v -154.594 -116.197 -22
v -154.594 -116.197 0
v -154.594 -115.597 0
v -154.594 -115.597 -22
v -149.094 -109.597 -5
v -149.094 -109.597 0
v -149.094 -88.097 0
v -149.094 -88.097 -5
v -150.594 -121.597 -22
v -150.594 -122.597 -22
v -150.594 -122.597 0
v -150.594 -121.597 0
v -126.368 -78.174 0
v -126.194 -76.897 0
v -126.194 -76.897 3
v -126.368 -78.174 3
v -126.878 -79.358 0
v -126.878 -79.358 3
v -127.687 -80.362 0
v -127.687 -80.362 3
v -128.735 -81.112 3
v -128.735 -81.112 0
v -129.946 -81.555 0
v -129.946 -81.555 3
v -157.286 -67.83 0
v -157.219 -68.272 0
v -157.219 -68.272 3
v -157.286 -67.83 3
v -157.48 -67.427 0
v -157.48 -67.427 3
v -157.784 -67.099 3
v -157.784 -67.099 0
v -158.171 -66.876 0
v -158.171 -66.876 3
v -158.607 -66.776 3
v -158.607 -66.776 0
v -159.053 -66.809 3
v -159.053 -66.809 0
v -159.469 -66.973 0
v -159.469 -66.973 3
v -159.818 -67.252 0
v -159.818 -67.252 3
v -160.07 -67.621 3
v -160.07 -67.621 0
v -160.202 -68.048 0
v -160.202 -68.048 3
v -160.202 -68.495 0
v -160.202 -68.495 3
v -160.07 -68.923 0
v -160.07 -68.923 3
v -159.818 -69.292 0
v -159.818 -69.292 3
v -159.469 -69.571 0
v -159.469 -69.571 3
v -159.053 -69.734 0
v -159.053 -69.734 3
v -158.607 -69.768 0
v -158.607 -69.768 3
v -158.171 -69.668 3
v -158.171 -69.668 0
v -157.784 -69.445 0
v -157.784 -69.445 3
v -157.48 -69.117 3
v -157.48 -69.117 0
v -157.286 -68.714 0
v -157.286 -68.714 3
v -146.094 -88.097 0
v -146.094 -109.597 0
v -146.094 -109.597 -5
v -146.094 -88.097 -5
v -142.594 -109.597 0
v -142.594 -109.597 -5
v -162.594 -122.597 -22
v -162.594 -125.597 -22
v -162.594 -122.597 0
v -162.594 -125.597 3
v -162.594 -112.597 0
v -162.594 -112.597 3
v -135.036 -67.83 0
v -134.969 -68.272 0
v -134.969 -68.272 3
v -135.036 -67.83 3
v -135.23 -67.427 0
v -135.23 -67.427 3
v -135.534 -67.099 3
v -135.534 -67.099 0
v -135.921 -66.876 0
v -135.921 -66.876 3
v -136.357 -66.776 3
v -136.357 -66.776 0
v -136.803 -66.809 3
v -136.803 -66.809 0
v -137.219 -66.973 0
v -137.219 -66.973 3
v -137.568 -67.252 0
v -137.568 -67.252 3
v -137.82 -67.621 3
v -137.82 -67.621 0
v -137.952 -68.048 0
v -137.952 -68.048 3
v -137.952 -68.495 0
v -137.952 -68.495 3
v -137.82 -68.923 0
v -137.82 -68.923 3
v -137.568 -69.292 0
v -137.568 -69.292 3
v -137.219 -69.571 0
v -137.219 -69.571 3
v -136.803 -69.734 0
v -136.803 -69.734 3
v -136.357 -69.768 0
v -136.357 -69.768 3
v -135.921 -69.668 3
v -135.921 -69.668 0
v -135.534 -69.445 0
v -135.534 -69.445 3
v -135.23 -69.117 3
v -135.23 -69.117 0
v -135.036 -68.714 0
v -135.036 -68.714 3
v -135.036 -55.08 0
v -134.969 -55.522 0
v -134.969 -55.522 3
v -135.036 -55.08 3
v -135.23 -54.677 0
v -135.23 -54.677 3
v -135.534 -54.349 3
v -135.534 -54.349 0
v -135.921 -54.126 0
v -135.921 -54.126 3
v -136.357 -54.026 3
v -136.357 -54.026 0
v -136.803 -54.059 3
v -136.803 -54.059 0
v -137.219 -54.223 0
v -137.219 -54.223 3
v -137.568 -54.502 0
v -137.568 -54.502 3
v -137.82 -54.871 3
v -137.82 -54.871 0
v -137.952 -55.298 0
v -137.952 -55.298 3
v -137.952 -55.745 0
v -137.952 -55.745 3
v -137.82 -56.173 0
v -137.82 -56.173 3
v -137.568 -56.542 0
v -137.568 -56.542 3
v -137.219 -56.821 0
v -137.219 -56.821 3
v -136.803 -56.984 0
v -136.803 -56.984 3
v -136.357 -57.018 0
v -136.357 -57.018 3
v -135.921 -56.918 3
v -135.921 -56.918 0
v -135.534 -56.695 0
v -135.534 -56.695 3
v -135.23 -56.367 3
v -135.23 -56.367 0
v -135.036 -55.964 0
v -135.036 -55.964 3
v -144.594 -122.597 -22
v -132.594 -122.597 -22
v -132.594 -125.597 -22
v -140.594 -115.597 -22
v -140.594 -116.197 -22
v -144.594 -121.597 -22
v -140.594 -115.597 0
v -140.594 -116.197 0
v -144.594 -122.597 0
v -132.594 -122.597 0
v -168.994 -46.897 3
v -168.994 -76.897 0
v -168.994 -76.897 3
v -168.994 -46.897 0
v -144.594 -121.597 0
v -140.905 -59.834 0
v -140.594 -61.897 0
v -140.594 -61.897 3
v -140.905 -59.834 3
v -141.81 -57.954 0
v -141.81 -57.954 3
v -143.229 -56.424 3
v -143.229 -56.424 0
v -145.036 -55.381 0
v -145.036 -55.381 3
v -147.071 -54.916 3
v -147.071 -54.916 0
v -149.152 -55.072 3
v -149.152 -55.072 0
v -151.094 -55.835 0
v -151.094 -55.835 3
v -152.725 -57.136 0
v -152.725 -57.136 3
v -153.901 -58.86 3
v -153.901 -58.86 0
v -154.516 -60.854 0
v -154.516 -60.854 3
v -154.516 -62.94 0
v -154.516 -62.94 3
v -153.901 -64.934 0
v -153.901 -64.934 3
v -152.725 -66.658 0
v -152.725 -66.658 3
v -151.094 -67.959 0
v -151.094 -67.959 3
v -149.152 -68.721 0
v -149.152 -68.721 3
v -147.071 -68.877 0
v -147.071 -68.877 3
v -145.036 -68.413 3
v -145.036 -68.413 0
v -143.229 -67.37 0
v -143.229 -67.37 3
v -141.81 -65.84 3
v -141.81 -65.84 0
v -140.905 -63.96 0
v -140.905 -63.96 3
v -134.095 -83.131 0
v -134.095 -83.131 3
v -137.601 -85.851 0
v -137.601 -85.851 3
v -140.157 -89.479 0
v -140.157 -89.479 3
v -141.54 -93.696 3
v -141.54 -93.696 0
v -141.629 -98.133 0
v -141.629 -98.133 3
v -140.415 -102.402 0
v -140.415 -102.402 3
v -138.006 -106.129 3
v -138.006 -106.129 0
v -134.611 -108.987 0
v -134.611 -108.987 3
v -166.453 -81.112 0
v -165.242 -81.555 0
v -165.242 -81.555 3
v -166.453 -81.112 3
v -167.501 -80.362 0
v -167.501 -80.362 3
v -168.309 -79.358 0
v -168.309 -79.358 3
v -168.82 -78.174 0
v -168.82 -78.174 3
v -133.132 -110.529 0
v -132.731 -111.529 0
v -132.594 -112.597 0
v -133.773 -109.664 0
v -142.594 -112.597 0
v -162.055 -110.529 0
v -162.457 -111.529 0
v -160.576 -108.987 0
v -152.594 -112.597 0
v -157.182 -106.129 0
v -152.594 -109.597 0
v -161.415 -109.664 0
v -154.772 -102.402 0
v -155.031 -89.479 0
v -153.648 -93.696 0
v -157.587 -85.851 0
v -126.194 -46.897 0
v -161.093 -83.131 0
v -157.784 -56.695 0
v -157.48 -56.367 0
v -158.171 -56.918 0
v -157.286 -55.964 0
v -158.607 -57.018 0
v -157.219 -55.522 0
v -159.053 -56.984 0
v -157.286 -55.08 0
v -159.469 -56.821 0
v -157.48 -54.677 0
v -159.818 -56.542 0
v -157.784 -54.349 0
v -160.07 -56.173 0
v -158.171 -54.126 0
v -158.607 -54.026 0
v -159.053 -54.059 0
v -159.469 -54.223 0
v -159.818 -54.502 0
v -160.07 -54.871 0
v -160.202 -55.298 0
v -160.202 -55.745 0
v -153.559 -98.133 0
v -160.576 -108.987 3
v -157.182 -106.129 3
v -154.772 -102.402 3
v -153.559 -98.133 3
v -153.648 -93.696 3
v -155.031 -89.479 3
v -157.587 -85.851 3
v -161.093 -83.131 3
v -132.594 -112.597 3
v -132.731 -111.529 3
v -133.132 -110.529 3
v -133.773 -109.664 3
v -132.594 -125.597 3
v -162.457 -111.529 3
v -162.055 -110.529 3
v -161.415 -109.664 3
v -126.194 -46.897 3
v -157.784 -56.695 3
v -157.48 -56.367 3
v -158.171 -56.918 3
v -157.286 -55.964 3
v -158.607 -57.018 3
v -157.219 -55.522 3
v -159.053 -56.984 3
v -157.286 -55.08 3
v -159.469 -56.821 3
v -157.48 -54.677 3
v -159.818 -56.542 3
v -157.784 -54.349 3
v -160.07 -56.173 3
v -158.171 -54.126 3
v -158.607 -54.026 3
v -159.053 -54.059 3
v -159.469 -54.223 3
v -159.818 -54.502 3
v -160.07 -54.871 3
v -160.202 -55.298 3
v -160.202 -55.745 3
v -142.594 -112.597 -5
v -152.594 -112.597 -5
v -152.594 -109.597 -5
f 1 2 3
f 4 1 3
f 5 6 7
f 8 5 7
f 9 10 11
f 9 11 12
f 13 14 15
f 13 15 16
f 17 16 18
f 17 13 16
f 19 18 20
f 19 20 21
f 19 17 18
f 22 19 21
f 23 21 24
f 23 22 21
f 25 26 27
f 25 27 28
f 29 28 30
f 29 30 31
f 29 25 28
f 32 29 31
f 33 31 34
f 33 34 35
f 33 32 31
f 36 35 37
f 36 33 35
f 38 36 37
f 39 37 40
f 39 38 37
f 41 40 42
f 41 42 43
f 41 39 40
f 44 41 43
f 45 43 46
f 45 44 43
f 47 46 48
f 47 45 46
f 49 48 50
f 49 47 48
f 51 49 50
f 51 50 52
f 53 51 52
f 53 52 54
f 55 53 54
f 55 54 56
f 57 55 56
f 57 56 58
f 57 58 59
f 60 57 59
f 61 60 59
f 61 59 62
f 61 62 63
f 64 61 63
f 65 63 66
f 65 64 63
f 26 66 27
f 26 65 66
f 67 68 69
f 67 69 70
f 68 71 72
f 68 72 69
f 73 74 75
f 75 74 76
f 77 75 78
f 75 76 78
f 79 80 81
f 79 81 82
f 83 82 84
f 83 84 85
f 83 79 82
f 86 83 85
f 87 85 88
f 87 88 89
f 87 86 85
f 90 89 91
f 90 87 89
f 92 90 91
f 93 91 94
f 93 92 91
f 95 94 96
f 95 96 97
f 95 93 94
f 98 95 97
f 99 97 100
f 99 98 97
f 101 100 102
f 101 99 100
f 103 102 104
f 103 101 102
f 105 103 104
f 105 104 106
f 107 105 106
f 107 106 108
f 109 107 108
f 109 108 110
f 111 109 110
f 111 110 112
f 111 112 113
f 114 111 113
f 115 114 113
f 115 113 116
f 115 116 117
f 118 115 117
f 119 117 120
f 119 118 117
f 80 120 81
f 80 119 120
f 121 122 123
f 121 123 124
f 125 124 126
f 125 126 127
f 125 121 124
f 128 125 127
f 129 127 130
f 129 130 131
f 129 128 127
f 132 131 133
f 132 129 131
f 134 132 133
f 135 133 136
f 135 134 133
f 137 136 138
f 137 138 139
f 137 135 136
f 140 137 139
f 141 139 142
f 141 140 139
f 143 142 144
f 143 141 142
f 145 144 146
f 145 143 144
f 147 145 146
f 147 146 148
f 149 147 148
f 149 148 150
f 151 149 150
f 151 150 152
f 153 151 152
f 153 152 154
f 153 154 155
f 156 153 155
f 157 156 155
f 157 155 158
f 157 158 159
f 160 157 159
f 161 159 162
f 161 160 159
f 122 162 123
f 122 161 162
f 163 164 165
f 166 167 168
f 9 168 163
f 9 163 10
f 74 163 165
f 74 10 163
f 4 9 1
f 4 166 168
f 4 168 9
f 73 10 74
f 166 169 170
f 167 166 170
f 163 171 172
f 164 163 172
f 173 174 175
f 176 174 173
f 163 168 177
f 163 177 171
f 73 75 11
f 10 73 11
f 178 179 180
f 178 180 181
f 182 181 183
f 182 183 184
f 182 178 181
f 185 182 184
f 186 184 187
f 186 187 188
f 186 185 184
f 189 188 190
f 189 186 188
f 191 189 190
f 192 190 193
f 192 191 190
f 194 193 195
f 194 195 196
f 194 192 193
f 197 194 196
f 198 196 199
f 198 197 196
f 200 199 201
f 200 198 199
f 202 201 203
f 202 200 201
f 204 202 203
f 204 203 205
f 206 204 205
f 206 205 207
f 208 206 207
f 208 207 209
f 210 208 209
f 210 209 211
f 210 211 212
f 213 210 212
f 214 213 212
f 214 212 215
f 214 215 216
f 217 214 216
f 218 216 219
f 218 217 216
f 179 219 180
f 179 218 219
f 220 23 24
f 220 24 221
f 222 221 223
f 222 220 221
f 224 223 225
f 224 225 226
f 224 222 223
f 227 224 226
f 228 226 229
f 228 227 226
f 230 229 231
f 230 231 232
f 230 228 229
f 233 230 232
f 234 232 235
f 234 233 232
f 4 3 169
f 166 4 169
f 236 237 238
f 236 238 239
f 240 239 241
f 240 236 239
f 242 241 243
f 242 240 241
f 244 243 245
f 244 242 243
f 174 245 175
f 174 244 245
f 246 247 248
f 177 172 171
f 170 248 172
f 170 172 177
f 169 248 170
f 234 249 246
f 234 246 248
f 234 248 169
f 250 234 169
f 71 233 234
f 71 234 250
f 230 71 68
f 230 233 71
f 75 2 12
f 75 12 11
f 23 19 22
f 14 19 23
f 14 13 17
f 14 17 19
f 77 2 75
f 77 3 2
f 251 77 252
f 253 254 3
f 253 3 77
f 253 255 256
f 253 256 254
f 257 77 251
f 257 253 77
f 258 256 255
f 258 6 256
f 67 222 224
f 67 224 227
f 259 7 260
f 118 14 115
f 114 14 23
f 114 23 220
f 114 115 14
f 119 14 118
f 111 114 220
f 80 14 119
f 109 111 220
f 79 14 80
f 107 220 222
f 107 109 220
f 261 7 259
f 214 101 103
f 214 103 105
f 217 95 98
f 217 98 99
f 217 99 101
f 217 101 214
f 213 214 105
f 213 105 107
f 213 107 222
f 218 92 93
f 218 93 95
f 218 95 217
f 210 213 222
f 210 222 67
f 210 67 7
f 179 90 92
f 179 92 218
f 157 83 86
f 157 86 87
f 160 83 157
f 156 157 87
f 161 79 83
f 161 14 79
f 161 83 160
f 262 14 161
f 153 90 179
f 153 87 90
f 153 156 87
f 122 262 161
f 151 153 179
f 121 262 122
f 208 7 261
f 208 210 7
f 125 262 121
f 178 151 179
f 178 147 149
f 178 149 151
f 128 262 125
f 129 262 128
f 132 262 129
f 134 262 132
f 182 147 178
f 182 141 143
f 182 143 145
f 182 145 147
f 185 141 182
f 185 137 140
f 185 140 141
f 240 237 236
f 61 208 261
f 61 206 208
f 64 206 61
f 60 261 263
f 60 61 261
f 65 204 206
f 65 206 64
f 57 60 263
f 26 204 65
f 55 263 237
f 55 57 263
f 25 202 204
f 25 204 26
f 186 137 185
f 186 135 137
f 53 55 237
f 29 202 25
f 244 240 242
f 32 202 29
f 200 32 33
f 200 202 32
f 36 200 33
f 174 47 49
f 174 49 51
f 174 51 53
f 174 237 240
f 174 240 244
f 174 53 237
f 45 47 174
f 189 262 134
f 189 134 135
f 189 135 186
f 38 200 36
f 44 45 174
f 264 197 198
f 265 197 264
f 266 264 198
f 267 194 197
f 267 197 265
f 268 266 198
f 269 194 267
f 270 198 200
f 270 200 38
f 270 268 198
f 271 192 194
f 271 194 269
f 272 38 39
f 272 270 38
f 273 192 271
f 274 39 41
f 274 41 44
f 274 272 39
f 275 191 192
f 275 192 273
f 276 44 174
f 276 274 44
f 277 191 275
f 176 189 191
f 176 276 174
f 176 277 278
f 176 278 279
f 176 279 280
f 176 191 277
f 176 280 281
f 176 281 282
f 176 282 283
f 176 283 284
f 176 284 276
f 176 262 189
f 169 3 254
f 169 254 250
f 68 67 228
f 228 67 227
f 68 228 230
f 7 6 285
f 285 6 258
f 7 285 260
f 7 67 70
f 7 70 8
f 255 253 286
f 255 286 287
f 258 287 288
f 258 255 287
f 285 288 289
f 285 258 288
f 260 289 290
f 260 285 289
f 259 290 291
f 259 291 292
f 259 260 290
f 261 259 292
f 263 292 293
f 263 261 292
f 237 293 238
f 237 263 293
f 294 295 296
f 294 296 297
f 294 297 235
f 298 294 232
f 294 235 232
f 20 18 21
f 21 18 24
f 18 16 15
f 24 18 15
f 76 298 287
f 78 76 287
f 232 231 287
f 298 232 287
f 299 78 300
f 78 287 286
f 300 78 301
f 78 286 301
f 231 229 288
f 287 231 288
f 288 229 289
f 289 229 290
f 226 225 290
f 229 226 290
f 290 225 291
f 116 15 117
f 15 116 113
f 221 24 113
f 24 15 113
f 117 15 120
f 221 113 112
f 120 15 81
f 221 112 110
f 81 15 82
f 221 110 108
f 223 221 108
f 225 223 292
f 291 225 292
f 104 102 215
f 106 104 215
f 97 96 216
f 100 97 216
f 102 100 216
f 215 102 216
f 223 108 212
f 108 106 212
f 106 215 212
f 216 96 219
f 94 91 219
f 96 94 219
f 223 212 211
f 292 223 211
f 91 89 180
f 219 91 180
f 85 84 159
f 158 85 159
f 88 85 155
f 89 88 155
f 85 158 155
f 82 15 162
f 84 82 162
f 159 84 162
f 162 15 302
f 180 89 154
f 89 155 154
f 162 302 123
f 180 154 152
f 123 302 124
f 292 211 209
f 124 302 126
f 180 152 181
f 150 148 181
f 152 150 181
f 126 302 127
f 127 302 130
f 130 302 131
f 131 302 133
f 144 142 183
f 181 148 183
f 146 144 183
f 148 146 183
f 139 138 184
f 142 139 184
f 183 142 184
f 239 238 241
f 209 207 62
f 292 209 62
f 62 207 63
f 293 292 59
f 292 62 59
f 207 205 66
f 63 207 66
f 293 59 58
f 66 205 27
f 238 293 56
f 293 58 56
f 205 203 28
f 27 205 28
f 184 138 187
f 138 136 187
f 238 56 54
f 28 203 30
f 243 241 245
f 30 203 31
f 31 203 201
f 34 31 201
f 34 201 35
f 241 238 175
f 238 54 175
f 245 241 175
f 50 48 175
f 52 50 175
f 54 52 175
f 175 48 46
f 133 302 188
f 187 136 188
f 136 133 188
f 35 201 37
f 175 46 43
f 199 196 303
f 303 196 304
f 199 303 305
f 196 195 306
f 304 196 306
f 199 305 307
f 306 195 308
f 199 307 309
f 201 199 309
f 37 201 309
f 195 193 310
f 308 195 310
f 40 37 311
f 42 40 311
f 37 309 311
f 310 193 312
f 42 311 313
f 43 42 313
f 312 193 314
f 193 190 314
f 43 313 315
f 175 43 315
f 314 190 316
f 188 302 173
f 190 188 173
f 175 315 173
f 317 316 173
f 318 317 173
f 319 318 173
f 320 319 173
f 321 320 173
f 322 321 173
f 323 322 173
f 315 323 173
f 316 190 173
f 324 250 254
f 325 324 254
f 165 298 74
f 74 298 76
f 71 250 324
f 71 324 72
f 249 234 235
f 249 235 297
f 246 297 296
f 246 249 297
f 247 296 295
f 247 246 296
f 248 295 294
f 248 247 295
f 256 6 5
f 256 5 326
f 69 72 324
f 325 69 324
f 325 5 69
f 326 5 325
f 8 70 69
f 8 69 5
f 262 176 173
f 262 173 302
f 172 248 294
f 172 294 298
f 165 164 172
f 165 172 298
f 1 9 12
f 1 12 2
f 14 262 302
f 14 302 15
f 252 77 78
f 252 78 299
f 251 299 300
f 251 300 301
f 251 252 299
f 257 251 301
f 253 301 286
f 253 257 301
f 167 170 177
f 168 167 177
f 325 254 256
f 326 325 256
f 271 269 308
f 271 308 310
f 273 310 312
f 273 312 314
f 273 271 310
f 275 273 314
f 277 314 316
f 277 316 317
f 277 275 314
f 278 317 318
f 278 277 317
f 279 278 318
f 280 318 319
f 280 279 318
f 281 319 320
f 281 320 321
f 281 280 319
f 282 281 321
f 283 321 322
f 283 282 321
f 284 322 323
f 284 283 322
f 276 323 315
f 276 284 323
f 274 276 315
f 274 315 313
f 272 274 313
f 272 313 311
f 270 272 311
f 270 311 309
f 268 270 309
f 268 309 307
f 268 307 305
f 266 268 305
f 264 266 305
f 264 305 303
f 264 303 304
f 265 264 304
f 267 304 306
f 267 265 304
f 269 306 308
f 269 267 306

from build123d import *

# Parameters (mm, degrees)
SCHIZZO1_R                   = 1.5
SCHIZZO1_R_2                 = 7
ESTRUSIONE_ESTRUSIONE1_DEPTH = 3
ESTRUSIONE_ESTRUSIONE2_DEPTH = 22
ESTRUSIONE_ESTRUSIONE3_DEPTH = 5


with BuildPart() as part:
    # Schizzo1 → Estrusione-Estrusione1 (new body)
    with BuildSketch(Plane.XY):
        with BuildLine():
            Line((-162.593868151, -125.596865141), (-132.593868151, -125.596865141))
            Line((-132.593868151, -125.596865141), (-132.593868151, -112.596865141))
            ThreePointArc((-132.593868151, -112.596865141), (-133.132467042, -110.529315323), (-134.611355423, -108.98732305))
            ThreePointArc((-134.611355423, -108.98732305), (-141.540233609, -93.695971479), (-129.946074176, -81.554709072))
            ThreePointArc((-129.946074176, -81.554709072), (-127.248599586, -79.887457063), (-126.193868151, -76.896865144))
            Line((-126.193868151, -76.896865144), (-126.193868151, -46.896865141))
            Line((-126.193868151, -46.896865141), (-168.993868151, -46.896865141))
            Line((-168.993868151, -46.896865141), (-168.993868151, -76.896865144))
            ThreePointArc((-168.993868151, -76.896865144), (-167.939136717, -79.887457063), (-165.241662126, -81.554709072))
            ThreePointArc((-165.241662126, -81.554709072), (-153.647502693, -93.695971479), (-160.576380879, -108.98732305))
            ThreePointArc((-160.576380879, -108.98732305), (-162.055269261, -110.529315323), (-162.593868151, -112.596865141))
            Line((-162.593868151, -112.596865141), (-162.593868151, -125.596865141))
        make_face()
        with Locations((-136.468868151, -55.521865143)):
            Circle(SCHIZZO1_R, mode=Mode.SUBTRACT)
        with Locations((-158.718868151, -68.271865143)):
            Circle(SCHIZZO1_R, mode=Mode.SUBTRACT)
        with Locations((-158.718868151, -55.521865143)):
            Circle(SCHIZZO1_R, mode=Mode.SUBTRACT)
        with Locations((-136.468868151, -68.271865143)):
            Circle(SCHIZZO1_R, mode=Mode.SUBTRACT)
        with Locations((-147.593868151, -61.896865143)):
            Circle(SCHIZZO1_R_2, mode=Mode.SUBTRACT)
    extrude(amount=ESTRUSIONE_ESTRUSIONE1_DEPTH)

    # Schizzo2 → Estrusione-Estrusione2 (add)
    with BuildSketch(Plane(origin=(0, 0, 0), x_dir=(-1, 0, 0), z_dir=(0, 0, -1))):
        Polygon((150.593868151, -122.596865141), (150.593868151, -121.596865141), (154.593868151, -116.196865141), (154.593868151, -115.596865141), (140.593868151, -115.596865141), (140.593868151, -116.196865141), (144.593868151, -121.596865141), (144.593868151, -122.596865141), (132.593868151, -122.596865141), (132.593868151, -125.596865141), (162.593868151, -125.596865141), (162.593868151, -122.596865141), align=None)
    extrude(amount=ESTRUSIONE_ESTRUSIONE2_DEPTH)

    # Schizzo3 → Estrusione-Estrusione3 (add)
    with BuildSketch(Plane(origin=(0, 0, 0), x_dir=(-1, 0, 0), z_dir=(0, 0, -1))):
        Polygon((142.593868151, -112.596865141), (152.593868151, -112.596865141), (152.593868151, -109.596865141), (149.093868151, -109.596865141), (149.093868151, -88.096865141), (146.093868151, -88.096865141), (146.093868151, -109.596865141), (142.593868151, -109.596865141), align=None)
    extrude(amount=ESTRUSIONE_ESTRUSIONE3_DEPTH)


solid = part.part
